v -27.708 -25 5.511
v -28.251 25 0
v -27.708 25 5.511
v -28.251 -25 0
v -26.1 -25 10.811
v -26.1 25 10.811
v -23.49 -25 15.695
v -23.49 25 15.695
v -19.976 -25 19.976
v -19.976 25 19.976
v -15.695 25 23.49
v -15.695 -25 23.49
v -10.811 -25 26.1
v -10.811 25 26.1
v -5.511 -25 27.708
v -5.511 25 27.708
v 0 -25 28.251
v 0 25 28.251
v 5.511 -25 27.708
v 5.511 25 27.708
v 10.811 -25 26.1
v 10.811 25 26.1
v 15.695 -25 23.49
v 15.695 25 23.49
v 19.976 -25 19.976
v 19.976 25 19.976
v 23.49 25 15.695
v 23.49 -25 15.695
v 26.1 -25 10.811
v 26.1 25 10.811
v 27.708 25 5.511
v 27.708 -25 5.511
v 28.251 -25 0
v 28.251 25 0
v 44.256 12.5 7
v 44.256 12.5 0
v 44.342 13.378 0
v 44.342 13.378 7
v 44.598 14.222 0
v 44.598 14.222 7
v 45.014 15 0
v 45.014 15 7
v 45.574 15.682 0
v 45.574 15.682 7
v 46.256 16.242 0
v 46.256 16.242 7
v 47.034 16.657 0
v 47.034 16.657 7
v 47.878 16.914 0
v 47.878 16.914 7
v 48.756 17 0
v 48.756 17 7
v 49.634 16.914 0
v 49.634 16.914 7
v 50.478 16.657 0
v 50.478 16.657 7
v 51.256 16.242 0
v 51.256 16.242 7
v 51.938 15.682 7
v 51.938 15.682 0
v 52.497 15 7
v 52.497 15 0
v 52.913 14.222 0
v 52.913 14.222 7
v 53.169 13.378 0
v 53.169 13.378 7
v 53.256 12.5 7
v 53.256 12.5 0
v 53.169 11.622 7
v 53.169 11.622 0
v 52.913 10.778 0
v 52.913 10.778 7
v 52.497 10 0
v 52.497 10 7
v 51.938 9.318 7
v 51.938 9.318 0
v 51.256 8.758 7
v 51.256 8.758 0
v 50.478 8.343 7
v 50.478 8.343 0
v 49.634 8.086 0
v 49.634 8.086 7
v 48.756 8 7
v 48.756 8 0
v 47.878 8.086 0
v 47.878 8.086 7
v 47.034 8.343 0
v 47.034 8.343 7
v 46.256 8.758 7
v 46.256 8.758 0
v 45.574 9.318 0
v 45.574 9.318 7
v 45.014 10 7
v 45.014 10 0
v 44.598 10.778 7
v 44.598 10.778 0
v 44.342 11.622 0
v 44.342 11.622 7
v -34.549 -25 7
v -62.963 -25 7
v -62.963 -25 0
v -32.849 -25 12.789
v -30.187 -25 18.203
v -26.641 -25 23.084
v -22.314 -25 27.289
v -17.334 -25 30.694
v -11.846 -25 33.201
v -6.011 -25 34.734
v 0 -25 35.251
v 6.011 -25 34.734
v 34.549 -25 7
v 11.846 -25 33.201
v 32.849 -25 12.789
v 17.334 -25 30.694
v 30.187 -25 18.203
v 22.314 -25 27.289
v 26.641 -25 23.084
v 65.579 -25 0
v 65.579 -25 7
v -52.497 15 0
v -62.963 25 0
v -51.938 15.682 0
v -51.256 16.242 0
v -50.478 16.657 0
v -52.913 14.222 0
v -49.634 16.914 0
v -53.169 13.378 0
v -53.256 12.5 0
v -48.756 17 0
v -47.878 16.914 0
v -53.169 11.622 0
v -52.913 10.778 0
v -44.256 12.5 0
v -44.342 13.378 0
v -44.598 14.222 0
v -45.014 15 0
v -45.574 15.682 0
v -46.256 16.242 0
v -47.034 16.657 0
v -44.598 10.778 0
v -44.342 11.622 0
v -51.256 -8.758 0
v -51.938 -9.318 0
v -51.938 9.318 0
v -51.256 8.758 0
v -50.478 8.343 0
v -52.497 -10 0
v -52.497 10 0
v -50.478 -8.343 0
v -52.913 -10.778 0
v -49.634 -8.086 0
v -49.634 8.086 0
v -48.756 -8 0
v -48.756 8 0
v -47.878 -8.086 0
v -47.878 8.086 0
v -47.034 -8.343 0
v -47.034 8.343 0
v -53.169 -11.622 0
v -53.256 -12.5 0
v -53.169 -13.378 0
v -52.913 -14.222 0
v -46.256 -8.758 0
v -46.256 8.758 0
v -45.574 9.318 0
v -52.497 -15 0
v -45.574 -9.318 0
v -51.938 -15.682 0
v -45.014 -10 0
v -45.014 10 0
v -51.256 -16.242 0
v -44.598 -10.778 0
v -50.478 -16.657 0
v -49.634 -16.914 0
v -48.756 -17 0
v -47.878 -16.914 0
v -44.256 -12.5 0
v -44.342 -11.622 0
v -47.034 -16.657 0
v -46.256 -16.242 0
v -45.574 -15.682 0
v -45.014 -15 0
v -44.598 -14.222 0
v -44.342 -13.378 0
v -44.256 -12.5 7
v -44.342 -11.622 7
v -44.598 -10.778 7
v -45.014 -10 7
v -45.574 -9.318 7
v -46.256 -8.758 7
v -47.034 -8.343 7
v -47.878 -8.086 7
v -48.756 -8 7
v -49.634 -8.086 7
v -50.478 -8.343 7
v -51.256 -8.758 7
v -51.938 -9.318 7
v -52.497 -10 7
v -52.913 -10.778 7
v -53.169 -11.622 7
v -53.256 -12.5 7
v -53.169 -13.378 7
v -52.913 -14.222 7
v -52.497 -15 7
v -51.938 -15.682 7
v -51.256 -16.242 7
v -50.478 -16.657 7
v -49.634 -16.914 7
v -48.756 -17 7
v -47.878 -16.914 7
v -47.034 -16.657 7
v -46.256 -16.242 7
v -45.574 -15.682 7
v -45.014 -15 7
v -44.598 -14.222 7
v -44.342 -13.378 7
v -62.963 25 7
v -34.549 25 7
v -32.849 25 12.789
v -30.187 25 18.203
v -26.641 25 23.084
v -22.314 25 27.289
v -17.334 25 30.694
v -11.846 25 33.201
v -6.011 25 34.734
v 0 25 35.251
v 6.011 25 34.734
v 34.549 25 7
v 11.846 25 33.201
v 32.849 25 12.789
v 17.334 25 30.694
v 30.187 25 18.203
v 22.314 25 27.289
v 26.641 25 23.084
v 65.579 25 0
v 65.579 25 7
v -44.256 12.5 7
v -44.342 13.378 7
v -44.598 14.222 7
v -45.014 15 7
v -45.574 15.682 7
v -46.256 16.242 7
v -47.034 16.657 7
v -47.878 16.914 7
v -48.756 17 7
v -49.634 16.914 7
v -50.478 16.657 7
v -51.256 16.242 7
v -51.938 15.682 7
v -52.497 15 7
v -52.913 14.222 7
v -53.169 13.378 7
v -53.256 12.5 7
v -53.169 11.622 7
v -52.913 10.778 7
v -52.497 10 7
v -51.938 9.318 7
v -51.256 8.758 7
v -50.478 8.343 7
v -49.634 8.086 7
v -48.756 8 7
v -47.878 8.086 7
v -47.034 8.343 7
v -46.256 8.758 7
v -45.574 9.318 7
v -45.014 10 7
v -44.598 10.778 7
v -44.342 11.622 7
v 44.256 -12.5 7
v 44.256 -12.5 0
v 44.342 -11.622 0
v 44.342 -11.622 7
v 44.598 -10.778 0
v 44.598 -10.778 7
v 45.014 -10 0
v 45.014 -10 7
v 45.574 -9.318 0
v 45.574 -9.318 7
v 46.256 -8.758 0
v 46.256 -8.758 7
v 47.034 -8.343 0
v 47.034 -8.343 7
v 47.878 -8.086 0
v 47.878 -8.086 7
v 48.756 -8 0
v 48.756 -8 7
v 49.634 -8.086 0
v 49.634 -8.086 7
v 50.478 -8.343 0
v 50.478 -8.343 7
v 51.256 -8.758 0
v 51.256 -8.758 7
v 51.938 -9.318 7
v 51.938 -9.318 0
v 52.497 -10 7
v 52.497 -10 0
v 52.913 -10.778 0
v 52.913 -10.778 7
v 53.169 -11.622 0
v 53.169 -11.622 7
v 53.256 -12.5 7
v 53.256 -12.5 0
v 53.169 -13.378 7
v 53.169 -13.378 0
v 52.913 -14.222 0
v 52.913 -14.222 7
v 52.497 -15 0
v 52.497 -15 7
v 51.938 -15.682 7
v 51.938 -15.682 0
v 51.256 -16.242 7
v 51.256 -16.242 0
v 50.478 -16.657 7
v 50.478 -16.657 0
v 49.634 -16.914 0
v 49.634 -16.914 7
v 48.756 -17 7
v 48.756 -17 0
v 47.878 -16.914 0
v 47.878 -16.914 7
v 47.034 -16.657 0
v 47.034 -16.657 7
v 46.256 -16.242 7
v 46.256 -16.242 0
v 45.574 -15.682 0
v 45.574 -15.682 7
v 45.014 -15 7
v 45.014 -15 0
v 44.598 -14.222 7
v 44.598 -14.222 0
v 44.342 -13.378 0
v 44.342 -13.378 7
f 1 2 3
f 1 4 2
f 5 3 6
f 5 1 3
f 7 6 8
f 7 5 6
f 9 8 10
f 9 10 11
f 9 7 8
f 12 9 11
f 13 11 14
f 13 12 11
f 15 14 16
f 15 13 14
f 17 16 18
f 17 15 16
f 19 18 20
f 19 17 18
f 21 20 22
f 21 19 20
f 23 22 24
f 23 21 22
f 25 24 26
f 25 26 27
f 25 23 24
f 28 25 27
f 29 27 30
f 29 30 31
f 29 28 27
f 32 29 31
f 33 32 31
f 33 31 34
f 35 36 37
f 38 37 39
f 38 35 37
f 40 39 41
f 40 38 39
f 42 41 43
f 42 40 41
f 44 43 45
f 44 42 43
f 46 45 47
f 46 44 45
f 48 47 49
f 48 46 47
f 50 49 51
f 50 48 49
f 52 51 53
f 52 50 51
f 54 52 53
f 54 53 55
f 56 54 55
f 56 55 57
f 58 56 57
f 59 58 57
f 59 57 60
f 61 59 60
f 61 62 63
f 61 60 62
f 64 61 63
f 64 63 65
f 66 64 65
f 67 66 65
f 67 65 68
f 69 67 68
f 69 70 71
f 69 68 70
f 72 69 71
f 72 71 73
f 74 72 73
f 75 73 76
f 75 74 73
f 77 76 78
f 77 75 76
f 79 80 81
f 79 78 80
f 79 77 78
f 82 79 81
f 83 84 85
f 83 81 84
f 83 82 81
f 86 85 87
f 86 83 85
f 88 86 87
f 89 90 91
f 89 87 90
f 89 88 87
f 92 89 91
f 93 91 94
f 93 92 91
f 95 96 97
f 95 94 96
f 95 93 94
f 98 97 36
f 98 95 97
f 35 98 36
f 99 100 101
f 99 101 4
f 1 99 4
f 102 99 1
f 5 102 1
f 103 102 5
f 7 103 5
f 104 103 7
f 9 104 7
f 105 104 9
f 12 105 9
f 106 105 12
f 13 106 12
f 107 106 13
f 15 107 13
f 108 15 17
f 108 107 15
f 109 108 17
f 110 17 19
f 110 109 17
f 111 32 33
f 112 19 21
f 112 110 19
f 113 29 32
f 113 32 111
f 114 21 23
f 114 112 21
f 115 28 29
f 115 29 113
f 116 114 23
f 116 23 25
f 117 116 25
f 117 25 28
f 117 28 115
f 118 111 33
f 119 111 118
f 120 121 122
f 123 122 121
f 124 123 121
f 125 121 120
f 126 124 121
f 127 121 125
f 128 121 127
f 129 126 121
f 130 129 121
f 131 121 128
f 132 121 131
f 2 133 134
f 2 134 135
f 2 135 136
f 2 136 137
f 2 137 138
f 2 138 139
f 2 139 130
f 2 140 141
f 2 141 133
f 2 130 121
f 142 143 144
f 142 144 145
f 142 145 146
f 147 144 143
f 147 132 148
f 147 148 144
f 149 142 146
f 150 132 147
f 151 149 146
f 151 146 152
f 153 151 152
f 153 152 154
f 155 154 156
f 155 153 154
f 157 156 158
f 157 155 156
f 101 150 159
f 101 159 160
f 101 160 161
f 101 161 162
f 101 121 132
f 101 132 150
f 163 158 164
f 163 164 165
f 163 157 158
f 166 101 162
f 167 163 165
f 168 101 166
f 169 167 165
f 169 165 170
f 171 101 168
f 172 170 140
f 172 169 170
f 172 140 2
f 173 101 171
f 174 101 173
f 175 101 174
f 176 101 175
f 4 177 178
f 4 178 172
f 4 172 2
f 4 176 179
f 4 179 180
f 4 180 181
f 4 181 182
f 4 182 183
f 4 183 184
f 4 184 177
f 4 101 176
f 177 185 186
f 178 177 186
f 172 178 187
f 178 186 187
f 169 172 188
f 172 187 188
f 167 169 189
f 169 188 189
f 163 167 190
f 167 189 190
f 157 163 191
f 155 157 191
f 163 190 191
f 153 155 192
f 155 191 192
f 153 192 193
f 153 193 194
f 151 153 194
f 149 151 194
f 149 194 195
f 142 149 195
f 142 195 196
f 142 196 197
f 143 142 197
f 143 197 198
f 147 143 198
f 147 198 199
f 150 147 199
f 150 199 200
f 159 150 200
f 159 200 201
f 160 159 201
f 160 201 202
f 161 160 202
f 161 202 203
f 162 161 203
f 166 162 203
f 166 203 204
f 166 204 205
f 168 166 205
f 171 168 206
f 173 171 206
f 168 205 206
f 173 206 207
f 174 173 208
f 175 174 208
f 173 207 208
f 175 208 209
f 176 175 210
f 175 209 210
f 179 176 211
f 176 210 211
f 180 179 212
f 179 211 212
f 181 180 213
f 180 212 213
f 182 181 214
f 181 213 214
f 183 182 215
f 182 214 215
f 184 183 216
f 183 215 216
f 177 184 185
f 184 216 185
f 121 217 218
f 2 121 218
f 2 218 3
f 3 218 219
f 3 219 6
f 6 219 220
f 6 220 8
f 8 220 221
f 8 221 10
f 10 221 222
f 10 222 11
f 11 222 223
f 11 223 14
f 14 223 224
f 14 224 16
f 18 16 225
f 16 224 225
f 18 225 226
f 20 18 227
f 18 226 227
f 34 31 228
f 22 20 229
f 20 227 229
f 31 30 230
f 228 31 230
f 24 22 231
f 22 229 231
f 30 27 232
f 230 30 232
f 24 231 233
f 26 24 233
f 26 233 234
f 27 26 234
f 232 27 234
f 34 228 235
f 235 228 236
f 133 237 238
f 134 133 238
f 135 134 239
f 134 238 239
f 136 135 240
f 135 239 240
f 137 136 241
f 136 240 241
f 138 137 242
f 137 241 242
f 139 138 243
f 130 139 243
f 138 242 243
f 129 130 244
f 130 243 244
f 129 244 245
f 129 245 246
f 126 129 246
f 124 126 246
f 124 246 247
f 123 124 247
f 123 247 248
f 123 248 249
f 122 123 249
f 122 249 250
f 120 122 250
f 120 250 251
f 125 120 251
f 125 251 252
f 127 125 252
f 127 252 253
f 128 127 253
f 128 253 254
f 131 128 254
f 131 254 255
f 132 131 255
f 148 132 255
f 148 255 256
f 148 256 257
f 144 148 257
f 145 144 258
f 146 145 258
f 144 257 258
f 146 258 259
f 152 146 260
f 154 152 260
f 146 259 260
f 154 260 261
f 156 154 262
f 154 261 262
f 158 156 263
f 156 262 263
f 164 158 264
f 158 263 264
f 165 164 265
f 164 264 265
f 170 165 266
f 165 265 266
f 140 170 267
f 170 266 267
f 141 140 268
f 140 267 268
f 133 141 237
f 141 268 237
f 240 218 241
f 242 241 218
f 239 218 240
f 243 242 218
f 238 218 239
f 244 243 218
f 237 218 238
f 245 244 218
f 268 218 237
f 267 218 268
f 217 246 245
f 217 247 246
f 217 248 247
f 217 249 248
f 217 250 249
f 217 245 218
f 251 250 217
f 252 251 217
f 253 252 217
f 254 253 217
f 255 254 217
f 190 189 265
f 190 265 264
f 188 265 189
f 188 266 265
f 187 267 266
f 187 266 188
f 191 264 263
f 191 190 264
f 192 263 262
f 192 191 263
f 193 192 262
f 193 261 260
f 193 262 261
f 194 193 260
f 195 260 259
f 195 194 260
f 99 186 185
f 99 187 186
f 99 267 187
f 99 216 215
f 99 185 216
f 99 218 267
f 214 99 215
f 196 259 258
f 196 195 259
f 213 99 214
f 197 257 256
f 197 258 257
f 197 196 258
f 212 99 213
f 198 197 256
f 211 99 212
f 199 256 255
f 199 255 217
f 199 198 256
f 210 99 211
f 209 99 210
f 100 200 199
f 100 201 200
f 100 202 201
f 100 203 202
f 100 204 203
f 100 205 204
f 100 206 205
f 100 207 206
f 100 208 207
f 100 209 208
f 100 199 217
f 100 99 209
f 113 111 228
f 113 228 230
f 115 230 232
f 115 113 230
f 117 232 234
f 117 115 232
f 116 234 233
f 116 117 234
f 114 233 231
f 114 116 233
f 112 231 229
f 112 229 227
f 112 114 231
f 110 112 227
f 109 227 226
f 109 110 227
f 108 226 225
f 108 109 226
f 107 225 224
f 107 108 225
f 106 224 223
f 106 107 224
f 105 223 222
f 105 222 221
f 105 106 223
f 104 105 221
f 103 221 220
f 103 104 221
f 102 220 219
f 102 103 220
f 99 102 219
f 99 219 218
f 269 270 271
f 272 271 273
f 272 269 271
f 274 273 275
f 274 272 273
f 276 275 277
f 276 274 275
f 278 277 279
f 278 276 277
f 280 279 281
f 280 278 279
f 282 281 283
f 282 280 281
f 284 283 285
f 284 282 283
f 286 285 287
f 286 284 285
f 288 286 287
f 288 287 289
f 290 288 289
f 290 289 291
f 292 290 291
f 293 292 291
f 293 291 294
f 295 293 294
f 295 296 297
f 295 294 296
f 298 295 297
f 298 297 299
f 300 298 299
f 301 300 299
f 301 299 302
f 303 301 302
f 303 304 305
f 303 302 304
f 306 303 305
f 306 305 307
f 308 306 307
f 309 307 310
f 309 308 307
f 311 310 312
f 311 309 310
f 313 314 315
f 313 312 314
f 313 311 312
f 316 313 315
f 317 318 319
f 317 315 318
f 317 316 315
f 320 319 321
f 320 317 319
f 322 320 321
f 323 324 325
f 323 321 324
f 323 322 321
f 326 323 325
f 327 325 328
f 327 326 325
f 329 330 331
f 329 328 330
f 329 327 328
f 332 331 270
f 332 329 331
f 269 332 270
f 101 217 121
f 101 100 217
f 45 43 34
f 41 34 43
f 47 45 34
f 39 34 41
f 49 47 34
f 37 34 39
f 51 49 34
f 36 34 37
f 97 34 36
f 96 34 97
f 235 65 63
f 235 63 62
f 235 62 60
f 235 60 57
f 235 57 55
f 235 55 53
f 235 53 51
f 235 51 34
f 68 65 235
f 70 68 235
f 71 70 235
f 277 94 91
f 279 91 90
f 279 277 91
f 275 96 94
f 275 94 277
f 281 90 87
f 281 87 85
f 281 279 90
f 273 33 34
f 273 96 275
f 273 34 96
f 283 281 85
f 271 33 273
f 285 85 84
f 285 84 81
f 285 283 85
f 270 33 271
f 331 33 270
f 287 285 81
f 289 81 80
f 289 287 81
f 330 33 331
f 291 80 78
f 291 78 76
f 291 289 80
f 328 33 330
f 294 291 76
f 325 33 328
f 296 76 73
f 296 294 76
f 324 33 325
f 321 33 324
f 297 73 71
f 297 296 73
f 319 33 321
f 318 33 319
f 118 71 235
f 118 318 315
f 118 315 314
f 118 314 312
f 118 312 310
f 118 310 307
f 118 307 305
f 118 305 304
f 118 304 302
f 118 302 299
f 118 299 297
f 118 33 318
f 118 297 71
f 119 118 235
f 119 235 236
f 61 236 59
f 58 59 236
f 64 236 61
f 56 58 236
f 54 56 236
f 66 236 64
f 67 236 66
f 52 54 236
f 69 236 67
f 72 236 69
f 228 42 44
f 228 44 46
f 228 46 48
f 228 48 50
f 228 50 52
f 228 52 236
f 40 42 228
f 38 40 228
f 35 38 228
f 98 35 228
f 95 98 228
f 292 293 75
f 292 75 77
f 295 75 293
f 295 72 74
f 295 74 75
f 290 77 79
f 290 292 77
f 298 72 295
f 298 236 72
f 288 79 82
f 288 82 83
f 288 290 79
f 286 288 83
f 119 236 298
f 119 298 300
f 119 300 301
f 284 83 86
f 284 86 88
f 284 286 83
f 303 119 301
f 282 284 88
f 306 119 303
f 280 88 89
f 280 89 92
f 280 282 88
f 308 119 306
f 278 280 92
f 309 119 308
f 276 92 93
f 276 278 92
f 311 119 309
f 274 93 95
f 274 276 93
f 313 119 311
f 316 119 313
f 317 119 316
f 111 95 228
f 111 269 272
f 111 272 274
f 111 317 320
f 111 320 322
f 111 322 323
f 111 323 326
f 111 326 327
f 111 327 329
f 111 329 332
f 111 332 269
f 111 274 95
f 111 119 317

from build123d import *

# Parameters (mm, degrees)
F1_DEPTH = 25
F2_R     = 4.5
F3_DEPTH = 7.001


# Not quite as in the source:
# - a pattern or mirror of a feature is missing from the dataset's text; its kind, count and spacing are read off the source's solid


with BuildPart() as f1:
    # F0 (on Front) → F1 (new body, symmetric)
    with BuildSketch(Plane.XZ):
        with BuildLine():
            ThreePointArc((-28.2506073348, 0), (0, 28.2506073348), (28.2506073348, 0))
            Line((28.2506073348, 0), (65.5786693096, 0))
            Line((65.5786693096, 0), (65.5786693096, 7))
            Line((65.5786693096, 7), (34.5485935672, 7))
            ThreePointArc((34.5485935672, 7), (0, 35.2506073348), (-34.5485935672, 7))
            Line((-34.5485935672, 7), (-62.9629269242, 7))
            Line((-62.9629269242, 7), (-62.9629269242, 0))
            Line((-62.9629269242, 0), (-28.2506073348, 0))
        make_face()
    extrude(amount=F1_DEPTH, both=True)

    # F2 (on face) → F3 (cut, through all)
    with BuildSketch(Plane.XY.offset(7)):
        with Locations((-48.7557602457, -12.5)):
            Circle(F2_R)
        with Locations((-48.7557602457, 12.5)):
            Circle(F2_R)
    f3 = extrude(amount=-F3_DEPTH, mode=Mode.SUBTRACT)

    # F3_copies: F3 across plane
    add(f3.mirror(Plane(origin=(0, 0, 0), x_dir=(0, 0, 1), z_dir=(1, 0, 0))), mode=Mode.SUBTRACT)


solid = f1.part
